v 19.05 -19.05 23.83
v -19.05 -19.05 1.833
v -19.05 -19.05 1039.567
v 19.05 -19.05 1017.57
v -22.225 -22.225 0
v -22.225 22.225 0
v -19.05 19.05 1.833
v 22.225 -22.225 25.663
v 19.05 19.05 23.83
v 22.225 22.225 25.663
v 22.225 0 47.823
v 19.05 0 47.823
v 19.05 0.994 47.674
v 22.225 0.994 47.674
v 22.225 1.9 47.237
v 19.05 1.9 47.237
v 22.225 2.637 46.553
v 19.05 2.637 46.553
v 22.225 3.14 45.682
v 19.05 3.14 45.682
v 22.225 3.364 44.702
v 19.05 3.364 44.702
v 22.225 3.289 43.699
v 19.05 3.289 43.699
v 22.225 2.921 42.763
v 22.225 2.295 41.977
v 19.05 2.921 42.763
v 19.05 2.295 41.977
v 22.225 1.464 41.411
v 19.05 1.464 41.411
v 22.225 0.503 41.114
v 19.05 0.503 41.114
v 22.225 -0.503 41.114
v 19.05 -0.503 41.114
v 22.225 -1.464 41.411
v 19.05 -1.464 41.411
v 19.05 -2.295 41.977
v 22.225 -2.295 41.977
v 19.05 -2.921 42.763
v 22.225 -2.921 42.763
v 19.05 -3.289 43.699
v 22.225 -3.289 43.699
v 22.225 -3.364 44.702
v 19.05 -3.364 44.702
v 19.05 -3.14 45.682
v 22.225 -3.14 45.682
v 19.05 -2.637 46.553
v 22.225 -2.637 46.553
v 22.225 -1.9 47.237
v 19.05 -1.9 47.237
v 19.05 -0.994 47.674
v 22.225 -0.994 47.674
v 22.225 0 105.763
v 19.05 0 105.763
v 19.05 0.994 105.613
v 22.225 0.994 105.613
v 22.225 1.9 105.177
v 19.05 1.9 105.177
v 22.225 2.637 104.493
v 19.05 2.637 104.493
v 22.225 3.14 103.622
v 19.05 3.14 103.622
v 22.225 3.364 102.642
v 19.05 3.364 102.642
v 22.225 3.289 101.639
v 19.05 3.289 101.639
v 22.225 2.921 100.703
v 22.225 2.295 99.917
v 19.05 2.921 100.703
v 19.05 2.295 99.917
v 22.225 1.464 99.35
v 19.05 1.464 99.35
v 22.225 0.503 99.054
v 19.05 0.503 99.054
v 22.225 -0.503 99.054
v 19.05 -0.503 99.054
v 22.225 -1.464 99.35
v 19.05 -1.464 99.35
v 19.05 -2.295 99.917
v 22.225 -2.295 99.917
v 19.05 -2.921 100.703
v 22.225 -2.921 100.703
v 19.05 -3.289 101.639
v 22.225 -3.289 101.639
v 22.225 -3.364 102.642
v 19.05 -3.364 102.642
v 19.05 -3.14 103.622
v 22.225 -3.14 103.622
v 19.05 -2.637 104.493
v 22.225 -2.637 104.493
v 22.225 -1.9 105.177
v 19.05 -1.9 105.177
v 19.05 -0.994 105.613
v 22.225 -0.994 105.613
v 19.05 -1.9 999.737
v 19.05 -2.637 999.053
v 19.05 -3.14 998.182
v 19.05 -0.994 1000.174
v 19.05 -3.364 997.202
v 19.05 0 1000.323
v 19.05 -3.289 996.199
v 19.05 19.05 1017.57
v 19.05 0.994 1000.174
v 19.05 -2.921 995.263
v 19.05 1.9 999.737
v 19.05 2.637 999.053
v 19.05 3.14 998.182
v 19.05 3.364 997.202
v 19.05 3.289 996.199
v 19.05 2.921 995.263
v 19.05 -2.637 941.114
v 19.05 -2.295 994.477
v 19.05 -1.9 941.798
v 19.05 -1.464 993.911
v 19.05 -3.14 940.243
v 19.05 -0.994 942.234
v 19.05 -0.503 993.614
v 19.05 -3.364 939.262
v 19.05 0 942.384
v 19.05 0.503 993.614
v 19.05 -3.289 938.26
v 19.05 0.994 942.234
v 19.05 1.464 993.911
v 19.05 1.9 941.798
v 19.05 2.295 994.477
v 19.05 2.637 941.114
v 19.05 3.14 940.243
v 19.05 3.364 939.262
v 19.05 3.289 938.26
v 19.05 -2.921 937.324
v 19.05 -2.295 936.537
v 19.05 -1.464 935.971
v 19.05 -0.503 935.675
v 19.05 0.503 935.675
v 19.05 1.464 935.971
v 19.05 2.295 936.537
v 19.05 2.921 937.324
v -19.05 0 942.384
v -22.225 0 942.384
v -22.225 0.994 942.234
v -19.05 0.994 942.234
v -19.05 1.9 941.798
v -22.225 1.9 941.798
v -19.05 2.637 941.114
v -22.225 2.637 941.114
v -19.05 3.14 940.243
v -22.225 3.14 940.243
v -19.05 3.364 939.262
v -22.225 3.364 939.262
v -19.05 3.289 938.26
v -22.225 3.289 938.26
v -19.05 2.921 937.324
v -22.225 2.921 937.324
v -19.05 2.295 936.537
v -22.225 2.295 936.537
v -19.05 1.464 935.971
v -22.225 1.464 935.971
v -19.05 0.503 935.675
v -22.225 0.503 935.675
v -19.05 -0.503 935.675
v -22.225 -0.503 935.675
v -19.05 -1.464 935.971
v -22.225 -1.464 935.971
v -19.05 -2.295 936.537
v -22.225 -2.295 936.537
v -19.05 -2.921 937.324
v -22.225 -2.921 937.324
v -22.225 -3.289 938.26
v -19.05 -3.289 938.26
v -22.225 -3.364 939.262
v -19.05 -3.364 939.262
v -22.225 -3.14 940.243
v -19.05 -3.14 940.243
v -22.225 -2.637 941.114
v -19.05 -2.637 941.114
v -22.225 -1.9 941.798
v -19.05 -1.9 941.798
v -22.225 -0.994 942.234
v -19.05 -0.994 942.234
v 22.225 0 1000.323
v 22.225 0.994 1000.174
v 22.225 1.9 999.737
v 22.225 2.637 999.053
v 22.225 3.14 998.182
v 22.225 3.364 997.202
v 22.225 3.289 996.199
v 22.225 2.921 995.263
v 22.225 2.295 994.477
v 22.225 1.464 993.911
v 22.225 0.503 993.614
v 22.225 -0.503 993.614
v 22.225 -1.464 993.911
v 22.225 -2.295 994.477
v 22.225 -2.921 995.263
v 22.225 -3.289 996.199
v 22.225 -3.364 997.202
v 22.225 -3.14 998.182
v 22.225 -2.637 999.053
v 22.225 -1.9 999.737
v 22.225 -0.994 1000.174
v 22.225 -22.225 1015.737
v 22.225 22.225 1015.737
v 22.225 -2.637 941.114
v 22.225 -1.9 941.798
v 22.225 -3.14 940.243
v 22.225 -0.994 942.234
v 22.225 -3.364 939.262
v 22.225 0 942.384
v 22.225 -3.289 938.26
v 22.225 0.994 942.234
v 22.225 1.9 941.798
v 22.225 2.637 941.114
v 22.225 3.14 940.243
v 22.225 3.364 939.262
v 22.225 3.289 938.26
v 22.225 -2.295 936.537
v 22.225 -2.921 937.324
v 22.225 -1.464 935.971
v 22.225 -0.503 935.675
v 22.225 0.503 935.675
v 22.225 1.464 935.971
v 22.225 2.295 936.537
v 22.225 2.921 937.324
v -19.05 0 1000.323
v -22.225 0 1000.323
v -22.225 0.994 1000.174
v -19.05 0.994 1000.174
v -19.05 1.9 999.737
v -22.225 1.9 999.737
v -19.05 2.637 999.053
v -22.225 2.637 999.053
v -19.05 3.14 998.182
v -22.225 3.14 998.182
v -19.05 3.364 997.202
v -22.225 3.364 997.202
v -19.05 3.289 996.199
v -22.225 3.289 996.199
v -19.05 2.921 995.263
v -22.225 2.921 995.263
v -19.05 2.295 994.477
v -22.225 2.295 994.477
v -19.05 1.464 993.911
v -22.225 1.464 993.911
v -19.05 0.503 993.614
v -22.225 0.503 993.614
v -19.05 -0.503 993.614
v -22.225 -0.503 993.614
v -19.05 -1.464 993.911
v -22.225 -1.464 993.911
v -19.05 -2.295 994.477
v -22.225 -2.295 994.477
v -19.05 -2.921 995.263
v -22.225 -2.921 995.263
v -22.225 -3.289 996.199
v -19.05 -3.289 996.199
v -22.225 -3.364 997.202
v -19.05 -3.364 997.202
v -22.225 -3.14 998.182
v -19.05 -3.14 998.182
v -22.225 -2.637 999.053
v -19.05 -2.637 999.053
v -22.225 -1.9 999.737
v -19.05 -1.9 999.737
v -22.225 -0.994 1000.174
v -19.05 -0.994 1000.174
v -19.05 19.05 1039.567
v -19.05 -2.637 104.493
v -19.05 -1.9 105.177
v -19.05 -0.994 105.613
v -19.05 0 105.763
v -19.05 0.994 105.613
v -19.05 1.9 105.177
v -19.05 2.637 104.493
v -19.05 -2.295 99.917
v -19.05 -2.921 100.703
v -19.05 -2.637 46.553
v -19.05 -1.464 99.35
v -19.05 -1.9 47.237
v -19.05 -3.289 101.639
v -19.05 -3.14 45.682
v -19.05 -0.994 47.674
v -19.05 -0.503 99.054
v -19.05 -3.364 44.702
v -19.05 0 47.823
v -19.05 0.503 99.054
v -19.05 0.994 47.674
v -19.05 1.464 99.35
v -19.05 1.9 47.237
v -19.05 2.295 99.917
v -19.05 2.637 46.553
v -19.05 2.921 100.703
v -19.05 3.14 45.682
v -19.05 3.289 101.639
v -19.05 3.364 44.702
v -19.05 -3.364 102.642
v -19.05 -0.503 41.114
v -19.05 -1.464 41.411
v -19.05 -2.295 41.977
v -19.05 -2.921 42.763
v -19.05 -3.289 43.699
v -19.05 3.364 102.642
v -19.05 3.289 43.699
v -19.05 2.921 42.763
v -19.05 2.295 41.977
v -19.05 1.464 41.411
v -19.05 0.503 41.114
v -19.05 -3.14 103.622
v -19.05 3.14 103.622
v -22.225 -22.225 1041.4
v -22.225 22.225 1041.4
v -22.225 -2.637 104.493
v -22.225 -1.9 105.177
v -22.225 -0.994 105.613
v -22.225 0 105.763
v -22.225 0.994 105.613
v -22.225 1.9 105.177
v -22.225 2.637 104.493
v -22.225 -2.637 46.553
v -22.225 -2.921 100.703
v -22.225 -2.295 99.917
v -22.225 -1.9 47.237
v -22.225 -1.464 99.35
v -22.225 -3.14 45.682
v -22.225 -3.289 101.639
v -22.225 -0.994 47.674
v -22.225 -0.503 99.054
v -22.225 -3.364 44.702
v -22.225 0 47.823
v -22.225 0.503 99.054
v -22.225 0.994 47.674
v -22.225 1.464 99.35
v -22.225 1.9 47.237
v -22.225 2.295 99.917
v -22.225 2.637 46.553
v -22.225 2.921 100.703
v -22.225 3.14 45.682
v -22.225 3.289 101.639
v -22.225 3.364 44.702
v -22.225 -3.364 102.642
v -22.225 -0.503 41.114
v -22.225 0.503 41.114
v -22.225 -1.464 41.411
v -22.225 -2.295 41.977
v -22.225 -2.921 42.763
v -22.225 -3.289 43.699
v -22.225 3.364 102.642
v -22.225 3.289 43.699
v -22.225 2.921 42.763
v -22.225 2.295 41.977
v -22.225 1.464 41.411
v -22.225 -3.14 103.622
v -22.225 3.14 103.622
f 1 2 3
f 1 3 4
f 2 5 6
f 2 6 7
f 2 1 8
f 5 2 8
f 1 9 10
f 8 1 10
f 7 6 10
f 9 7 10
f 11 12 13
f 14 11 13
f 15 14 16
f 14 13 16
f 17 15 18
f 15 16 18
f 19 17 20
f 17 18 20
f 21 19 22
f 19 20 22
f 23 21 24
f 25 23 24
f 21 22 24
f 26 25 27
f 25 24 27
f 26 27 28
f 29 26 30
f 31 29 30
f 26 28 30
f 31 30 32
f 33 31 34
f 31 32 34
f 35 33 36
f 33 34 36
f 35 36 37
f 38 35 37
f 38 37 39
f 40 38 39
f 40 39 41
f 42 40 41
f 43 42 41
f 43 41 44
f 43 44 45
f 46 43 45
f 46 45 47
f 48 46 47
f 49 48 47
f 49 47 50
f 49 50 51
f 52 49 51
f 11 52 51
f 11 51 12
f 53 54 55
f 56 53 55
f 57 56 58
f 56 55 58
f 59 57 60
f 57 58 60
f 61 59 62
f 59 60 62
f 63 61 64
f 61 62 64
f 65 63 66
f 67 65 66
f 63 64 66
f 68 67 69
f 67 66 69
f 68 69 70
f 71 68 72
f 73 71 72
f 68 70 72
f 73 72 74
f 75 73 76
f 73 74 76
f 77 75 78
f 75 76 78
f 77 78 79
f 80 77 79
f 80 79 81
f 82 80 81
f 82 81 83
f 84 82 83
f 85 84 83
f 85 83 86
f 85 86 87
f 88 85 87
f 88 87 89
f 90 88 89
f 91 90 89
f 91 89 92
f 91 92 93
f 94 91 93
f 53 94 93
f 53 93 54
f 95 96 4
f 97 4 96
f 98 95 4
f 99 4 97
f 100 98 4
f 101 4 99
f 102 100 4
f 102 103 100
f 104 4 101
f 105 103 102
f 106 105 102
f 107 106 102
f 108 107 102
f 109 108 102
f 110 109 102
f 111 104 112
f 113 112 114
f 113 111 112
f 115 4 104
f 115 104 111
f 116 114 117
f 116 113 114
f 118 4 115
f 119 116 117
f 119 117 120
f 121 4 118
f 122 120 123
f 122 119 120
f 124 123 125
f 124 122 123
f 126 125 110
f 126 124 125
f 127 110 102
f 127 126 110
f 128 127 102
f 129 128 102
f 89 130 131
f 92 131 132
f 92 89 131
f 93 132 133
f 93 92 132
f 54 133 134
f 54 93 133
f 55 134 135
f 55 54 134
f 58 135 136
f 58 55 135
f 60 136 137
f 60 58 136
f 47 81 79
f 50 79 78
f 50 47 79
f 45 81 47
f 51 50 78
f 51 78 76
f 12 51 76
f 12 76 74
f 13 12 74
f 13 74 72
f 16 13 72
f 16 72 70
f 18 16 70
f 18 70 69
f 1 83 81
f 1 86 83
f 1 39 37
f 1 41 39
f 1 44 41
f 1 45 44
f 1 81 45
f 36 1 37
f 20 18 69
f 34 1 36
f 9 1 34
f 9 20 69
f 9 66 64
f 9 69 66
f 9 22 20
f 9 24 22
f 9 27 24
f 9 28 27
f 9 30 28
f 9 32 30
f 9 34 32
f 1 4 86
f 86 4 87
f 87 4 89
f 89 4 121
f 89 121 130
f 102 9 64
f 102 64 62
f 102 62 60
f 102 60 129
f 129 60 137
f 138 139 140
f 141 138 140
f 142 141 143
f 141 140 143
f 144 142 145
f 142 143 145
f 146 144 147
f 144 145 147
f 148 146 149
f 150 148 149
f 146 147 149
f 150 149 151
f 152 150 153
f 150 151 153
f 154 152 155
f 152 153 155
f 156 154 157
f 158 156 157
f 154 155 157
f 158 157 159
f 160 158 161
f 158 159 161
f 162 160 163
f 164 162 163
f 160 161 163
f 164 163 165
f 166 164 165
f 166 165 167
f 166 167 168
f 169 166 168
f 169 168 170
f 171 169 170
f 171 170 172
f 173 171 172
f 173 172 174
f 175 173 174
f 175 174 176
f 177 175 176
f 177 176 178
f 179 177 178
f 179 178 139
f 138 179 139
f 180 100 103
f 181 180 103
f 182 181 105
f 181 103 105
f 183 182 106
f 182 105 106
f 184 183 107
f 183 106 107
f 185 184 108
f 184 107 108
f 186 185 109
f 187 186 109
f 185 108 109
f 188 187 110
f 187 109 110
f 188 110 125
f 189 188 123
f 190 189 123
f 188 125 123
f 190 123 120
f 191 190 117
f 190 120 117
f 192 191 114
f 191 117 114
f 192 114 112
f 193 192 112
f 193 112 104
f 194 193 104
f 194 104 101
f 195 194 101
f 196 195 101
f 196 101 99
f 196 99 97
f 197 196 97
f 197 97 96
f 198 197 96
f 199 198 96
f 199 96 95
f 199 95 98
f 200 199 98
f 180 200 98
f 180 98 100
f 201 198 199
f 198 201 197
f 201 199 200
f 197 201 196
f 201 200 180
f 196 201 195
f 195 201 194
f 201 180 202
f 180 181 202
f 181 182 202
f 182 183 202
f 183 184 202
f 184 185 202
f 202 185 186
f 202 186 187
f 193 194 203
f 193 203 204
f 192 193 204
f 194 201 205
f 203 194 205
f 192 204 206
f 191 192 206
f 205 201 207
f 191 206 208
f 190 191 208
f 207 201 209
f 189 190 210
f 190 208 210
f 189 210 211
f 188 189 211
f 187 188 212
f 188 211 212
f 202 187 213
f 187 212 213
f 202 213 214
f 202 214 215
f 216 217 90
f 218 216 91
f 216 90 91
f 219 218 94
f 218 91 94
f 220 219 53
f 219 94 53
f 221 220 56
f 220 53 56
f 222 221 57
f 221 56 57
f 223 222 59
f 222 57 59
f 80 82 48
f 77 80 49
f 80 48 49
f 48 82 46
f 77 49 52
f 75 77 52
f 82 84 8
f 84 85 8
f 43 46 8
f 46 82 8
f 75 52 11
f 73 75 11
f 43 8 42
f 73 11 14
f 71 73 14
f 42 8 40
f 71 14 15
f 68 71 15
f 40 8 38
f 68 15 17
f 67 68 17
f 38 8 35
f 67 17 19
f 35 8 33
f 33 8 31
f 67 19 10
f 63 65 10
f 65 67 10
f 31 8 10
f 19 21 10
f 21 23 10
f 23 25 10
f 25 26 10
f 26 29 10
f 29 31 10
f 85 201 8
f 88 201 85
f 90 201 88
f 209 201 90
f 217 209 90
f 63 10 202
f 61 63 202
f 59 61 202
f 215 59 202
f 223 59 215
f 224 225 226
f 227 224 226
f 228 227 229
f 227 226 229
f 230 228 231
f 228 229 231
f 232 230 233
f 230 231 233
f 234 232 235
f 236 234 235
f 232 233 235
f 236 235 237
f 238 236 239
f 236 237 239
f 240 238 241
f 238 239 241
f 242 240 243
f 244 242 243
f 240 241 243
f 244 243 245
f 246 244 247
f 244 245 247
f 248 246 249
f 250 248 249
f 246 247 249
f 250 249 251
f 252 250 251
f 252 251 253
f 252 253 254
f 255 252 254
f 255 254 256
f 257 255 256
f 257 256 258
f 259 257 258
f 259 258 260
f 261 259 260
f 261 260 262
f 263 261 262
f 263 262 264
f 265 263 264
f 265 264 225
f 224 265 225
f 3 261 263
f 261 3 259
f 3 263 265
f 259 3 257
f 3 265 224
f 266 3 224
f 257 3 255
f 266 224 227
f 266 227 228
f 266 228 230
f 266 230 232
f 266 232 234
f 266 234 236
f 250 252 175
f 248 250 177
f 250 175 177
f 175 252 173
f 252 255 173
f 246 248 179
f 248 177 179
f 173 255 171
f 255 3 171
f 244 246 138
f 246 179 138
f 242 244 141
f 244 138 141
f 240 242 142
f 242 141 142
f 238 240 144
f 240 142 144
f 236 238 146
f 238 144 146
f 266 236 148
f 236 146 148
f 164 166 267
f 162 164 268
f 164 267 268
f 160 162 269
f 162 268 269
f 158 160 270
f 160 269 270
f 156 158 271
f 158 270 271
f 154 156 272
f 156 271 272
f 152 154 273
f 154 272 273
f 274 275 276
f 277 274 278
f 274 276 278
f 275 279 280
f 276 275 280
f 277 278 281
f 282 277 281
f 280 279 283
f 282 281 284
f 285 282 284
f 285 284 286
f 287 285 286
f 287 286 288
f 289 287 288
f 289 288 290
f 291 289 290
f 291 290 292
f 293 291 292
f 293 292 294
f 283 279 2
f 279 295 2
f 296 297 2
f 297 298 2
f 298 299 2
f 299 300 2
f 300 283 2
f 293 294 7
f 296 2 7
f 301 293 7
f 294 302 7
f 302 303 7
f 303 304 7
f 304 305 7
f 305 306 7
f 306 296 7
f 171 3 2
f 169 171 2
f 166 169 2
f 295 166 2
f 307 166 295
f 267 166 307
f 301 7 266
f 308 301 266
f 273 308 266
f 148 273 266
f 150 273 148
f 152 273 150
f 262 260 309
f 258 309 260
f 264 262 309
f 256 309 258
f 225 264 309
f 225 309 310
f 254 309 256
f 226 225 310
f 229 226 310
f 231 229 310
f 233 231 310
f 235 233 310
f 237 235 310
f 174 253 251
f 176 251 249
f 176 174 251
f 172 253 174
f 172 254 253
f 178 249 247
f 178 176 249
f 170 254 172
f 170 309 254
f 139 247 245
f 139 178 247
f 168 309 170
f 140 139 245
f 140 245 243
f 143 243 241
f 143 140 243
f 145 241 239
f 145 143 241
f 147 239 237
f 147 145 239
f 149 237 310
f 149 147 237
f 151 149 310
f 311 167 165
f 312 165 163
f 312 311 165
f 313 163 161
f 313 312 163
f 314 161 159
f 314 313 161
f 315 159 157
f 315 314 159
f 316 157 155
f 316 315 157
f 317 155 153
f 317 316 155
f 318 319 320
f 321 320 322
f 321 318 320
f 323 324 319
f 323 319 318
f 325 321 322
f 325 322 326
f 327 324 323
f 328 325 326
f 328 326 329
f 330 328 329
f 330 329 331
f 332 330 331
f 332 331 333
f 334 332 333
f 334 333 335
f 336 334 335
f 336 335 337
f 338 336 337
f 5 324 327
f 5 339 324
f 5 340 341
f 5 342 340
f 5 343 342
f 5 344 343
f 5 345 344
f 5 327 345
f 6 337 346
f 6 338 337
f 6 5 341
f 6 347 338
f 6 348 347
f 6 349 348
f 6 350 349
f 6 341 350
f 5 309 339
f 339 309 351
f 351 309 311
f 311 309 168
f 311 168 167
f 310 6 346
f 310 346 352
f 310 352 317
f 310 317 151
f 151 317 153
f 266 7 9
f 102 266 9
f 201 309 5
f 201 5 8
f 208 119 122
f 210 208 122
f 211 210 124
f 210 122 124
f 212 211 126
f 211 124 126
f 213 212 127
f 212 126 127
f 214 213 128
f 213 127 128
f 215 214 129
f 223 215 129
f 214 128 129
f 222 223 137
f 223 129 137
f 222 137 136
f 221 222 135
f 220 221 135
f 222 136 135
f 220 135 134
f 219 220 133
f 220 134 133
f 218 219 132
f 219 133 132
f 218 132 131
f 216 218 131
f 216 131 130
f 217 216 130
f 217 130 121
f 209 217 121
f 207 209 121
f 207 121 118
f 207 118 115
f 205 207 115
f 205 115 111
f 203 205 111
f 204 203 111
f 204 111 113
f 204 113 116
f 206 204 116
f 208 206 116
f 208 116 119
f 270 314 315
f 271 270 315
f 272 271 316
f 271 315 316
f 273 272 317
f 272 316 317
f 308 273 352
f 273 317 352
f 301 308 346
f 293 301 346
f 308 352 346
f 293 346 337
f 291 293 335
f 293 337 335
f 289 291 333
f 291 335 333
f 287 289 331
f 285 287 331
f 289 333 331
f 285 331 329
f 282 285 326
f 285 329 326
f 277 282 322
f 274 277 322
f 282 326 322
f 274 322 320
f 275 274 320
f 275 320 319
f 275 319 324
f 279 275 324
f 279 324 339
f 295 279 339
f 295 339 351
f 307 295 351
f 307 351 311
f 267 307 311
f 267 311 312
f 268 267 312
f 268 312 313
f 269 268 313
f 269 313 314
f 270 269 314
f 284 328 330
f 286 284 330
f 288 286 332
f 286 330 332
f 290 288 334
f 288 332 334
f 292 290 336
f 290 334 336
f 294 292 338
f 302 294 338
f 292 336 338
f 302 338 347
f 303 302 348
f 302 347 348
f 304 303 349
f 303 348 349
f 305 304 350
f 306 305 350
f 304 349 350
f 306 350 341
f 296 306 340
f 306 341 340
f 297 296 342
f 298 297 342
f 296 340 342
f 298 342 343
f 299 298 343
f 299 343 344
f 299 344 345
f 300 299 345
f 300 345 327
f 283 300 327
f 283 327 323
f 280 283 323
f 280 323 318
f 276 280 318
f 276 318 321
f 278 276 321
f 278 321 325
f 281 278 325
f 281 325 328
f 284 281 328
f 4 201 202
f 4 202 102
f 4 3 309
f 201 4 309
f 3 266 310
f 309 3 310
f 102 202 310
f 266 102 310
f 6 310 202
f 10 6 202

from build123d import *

# Parameters (mm, degrees)
SKETCH1_W           = 44.45
SKETCH1_H           = 44.45
SKETCH1_W_2         = 38.1
SKETCH1_H_2         = 38.1
BOSS_EXTRUDE1_DEPTH = 1041.4
CUT_EXTRUDE2_DEPTH  = 1041.4
SKETCH9_R           = 3.3734375
CUT_EXTRUDE3_DEPTH  = 1043.585110734


with BuildPart() as part:
    # Sketch1 → Boss-Extrude1 (new body)
    with BuildSketch(Plane.XY):
        Rectangle(SKETCH1_W, SKETCH1_H)
        Rectangle(SKETCH1_W_2, SKETCH1_H_2, mode=Mode.SUBTRACT)
    extrude(amount=BOSS_EXTRUDE1_DEPTH)

    # Sketch2 → Cut-Extrude2 (cut)
    with BuildSketch(Plane(origin=(0, 22.225, 0), x_dir=(1, 0, 0), z_dir=(0, 1, 0))):
        Polygon((-22.225, -1041.4), (22.225, -1041.4), (22.225, -1015.736780535), align=None)
        Polygon((-22.225, 0), (22.225, -25.663219465), (22.225, 0), align=None)
    extrude(amount=-CUT_EXTRUDE2_DEPTH, mode=Mode.SUBTRACT)

    # Sketch9 → Cut-Extrude3 (cut, through all)
    with BuildSketch(Plane.ZY.offset(22.225)):
        with Locations((996.95, 0)):
            Circle(SKETCH9_R)
        with Locations((44.45, 0)):
            Circle(SKETCH9_R)
        with Locations((102.389658314, 0)):
            Circle(SKETCH9_R)
        with Locations((939.010341686, 0)):
            Circle(SKETCH9_R)
    extrude(amount=-CUT_EXTRUDE3_DEPTH, mode=Mode.SUBTRACT)


solid = part.part
